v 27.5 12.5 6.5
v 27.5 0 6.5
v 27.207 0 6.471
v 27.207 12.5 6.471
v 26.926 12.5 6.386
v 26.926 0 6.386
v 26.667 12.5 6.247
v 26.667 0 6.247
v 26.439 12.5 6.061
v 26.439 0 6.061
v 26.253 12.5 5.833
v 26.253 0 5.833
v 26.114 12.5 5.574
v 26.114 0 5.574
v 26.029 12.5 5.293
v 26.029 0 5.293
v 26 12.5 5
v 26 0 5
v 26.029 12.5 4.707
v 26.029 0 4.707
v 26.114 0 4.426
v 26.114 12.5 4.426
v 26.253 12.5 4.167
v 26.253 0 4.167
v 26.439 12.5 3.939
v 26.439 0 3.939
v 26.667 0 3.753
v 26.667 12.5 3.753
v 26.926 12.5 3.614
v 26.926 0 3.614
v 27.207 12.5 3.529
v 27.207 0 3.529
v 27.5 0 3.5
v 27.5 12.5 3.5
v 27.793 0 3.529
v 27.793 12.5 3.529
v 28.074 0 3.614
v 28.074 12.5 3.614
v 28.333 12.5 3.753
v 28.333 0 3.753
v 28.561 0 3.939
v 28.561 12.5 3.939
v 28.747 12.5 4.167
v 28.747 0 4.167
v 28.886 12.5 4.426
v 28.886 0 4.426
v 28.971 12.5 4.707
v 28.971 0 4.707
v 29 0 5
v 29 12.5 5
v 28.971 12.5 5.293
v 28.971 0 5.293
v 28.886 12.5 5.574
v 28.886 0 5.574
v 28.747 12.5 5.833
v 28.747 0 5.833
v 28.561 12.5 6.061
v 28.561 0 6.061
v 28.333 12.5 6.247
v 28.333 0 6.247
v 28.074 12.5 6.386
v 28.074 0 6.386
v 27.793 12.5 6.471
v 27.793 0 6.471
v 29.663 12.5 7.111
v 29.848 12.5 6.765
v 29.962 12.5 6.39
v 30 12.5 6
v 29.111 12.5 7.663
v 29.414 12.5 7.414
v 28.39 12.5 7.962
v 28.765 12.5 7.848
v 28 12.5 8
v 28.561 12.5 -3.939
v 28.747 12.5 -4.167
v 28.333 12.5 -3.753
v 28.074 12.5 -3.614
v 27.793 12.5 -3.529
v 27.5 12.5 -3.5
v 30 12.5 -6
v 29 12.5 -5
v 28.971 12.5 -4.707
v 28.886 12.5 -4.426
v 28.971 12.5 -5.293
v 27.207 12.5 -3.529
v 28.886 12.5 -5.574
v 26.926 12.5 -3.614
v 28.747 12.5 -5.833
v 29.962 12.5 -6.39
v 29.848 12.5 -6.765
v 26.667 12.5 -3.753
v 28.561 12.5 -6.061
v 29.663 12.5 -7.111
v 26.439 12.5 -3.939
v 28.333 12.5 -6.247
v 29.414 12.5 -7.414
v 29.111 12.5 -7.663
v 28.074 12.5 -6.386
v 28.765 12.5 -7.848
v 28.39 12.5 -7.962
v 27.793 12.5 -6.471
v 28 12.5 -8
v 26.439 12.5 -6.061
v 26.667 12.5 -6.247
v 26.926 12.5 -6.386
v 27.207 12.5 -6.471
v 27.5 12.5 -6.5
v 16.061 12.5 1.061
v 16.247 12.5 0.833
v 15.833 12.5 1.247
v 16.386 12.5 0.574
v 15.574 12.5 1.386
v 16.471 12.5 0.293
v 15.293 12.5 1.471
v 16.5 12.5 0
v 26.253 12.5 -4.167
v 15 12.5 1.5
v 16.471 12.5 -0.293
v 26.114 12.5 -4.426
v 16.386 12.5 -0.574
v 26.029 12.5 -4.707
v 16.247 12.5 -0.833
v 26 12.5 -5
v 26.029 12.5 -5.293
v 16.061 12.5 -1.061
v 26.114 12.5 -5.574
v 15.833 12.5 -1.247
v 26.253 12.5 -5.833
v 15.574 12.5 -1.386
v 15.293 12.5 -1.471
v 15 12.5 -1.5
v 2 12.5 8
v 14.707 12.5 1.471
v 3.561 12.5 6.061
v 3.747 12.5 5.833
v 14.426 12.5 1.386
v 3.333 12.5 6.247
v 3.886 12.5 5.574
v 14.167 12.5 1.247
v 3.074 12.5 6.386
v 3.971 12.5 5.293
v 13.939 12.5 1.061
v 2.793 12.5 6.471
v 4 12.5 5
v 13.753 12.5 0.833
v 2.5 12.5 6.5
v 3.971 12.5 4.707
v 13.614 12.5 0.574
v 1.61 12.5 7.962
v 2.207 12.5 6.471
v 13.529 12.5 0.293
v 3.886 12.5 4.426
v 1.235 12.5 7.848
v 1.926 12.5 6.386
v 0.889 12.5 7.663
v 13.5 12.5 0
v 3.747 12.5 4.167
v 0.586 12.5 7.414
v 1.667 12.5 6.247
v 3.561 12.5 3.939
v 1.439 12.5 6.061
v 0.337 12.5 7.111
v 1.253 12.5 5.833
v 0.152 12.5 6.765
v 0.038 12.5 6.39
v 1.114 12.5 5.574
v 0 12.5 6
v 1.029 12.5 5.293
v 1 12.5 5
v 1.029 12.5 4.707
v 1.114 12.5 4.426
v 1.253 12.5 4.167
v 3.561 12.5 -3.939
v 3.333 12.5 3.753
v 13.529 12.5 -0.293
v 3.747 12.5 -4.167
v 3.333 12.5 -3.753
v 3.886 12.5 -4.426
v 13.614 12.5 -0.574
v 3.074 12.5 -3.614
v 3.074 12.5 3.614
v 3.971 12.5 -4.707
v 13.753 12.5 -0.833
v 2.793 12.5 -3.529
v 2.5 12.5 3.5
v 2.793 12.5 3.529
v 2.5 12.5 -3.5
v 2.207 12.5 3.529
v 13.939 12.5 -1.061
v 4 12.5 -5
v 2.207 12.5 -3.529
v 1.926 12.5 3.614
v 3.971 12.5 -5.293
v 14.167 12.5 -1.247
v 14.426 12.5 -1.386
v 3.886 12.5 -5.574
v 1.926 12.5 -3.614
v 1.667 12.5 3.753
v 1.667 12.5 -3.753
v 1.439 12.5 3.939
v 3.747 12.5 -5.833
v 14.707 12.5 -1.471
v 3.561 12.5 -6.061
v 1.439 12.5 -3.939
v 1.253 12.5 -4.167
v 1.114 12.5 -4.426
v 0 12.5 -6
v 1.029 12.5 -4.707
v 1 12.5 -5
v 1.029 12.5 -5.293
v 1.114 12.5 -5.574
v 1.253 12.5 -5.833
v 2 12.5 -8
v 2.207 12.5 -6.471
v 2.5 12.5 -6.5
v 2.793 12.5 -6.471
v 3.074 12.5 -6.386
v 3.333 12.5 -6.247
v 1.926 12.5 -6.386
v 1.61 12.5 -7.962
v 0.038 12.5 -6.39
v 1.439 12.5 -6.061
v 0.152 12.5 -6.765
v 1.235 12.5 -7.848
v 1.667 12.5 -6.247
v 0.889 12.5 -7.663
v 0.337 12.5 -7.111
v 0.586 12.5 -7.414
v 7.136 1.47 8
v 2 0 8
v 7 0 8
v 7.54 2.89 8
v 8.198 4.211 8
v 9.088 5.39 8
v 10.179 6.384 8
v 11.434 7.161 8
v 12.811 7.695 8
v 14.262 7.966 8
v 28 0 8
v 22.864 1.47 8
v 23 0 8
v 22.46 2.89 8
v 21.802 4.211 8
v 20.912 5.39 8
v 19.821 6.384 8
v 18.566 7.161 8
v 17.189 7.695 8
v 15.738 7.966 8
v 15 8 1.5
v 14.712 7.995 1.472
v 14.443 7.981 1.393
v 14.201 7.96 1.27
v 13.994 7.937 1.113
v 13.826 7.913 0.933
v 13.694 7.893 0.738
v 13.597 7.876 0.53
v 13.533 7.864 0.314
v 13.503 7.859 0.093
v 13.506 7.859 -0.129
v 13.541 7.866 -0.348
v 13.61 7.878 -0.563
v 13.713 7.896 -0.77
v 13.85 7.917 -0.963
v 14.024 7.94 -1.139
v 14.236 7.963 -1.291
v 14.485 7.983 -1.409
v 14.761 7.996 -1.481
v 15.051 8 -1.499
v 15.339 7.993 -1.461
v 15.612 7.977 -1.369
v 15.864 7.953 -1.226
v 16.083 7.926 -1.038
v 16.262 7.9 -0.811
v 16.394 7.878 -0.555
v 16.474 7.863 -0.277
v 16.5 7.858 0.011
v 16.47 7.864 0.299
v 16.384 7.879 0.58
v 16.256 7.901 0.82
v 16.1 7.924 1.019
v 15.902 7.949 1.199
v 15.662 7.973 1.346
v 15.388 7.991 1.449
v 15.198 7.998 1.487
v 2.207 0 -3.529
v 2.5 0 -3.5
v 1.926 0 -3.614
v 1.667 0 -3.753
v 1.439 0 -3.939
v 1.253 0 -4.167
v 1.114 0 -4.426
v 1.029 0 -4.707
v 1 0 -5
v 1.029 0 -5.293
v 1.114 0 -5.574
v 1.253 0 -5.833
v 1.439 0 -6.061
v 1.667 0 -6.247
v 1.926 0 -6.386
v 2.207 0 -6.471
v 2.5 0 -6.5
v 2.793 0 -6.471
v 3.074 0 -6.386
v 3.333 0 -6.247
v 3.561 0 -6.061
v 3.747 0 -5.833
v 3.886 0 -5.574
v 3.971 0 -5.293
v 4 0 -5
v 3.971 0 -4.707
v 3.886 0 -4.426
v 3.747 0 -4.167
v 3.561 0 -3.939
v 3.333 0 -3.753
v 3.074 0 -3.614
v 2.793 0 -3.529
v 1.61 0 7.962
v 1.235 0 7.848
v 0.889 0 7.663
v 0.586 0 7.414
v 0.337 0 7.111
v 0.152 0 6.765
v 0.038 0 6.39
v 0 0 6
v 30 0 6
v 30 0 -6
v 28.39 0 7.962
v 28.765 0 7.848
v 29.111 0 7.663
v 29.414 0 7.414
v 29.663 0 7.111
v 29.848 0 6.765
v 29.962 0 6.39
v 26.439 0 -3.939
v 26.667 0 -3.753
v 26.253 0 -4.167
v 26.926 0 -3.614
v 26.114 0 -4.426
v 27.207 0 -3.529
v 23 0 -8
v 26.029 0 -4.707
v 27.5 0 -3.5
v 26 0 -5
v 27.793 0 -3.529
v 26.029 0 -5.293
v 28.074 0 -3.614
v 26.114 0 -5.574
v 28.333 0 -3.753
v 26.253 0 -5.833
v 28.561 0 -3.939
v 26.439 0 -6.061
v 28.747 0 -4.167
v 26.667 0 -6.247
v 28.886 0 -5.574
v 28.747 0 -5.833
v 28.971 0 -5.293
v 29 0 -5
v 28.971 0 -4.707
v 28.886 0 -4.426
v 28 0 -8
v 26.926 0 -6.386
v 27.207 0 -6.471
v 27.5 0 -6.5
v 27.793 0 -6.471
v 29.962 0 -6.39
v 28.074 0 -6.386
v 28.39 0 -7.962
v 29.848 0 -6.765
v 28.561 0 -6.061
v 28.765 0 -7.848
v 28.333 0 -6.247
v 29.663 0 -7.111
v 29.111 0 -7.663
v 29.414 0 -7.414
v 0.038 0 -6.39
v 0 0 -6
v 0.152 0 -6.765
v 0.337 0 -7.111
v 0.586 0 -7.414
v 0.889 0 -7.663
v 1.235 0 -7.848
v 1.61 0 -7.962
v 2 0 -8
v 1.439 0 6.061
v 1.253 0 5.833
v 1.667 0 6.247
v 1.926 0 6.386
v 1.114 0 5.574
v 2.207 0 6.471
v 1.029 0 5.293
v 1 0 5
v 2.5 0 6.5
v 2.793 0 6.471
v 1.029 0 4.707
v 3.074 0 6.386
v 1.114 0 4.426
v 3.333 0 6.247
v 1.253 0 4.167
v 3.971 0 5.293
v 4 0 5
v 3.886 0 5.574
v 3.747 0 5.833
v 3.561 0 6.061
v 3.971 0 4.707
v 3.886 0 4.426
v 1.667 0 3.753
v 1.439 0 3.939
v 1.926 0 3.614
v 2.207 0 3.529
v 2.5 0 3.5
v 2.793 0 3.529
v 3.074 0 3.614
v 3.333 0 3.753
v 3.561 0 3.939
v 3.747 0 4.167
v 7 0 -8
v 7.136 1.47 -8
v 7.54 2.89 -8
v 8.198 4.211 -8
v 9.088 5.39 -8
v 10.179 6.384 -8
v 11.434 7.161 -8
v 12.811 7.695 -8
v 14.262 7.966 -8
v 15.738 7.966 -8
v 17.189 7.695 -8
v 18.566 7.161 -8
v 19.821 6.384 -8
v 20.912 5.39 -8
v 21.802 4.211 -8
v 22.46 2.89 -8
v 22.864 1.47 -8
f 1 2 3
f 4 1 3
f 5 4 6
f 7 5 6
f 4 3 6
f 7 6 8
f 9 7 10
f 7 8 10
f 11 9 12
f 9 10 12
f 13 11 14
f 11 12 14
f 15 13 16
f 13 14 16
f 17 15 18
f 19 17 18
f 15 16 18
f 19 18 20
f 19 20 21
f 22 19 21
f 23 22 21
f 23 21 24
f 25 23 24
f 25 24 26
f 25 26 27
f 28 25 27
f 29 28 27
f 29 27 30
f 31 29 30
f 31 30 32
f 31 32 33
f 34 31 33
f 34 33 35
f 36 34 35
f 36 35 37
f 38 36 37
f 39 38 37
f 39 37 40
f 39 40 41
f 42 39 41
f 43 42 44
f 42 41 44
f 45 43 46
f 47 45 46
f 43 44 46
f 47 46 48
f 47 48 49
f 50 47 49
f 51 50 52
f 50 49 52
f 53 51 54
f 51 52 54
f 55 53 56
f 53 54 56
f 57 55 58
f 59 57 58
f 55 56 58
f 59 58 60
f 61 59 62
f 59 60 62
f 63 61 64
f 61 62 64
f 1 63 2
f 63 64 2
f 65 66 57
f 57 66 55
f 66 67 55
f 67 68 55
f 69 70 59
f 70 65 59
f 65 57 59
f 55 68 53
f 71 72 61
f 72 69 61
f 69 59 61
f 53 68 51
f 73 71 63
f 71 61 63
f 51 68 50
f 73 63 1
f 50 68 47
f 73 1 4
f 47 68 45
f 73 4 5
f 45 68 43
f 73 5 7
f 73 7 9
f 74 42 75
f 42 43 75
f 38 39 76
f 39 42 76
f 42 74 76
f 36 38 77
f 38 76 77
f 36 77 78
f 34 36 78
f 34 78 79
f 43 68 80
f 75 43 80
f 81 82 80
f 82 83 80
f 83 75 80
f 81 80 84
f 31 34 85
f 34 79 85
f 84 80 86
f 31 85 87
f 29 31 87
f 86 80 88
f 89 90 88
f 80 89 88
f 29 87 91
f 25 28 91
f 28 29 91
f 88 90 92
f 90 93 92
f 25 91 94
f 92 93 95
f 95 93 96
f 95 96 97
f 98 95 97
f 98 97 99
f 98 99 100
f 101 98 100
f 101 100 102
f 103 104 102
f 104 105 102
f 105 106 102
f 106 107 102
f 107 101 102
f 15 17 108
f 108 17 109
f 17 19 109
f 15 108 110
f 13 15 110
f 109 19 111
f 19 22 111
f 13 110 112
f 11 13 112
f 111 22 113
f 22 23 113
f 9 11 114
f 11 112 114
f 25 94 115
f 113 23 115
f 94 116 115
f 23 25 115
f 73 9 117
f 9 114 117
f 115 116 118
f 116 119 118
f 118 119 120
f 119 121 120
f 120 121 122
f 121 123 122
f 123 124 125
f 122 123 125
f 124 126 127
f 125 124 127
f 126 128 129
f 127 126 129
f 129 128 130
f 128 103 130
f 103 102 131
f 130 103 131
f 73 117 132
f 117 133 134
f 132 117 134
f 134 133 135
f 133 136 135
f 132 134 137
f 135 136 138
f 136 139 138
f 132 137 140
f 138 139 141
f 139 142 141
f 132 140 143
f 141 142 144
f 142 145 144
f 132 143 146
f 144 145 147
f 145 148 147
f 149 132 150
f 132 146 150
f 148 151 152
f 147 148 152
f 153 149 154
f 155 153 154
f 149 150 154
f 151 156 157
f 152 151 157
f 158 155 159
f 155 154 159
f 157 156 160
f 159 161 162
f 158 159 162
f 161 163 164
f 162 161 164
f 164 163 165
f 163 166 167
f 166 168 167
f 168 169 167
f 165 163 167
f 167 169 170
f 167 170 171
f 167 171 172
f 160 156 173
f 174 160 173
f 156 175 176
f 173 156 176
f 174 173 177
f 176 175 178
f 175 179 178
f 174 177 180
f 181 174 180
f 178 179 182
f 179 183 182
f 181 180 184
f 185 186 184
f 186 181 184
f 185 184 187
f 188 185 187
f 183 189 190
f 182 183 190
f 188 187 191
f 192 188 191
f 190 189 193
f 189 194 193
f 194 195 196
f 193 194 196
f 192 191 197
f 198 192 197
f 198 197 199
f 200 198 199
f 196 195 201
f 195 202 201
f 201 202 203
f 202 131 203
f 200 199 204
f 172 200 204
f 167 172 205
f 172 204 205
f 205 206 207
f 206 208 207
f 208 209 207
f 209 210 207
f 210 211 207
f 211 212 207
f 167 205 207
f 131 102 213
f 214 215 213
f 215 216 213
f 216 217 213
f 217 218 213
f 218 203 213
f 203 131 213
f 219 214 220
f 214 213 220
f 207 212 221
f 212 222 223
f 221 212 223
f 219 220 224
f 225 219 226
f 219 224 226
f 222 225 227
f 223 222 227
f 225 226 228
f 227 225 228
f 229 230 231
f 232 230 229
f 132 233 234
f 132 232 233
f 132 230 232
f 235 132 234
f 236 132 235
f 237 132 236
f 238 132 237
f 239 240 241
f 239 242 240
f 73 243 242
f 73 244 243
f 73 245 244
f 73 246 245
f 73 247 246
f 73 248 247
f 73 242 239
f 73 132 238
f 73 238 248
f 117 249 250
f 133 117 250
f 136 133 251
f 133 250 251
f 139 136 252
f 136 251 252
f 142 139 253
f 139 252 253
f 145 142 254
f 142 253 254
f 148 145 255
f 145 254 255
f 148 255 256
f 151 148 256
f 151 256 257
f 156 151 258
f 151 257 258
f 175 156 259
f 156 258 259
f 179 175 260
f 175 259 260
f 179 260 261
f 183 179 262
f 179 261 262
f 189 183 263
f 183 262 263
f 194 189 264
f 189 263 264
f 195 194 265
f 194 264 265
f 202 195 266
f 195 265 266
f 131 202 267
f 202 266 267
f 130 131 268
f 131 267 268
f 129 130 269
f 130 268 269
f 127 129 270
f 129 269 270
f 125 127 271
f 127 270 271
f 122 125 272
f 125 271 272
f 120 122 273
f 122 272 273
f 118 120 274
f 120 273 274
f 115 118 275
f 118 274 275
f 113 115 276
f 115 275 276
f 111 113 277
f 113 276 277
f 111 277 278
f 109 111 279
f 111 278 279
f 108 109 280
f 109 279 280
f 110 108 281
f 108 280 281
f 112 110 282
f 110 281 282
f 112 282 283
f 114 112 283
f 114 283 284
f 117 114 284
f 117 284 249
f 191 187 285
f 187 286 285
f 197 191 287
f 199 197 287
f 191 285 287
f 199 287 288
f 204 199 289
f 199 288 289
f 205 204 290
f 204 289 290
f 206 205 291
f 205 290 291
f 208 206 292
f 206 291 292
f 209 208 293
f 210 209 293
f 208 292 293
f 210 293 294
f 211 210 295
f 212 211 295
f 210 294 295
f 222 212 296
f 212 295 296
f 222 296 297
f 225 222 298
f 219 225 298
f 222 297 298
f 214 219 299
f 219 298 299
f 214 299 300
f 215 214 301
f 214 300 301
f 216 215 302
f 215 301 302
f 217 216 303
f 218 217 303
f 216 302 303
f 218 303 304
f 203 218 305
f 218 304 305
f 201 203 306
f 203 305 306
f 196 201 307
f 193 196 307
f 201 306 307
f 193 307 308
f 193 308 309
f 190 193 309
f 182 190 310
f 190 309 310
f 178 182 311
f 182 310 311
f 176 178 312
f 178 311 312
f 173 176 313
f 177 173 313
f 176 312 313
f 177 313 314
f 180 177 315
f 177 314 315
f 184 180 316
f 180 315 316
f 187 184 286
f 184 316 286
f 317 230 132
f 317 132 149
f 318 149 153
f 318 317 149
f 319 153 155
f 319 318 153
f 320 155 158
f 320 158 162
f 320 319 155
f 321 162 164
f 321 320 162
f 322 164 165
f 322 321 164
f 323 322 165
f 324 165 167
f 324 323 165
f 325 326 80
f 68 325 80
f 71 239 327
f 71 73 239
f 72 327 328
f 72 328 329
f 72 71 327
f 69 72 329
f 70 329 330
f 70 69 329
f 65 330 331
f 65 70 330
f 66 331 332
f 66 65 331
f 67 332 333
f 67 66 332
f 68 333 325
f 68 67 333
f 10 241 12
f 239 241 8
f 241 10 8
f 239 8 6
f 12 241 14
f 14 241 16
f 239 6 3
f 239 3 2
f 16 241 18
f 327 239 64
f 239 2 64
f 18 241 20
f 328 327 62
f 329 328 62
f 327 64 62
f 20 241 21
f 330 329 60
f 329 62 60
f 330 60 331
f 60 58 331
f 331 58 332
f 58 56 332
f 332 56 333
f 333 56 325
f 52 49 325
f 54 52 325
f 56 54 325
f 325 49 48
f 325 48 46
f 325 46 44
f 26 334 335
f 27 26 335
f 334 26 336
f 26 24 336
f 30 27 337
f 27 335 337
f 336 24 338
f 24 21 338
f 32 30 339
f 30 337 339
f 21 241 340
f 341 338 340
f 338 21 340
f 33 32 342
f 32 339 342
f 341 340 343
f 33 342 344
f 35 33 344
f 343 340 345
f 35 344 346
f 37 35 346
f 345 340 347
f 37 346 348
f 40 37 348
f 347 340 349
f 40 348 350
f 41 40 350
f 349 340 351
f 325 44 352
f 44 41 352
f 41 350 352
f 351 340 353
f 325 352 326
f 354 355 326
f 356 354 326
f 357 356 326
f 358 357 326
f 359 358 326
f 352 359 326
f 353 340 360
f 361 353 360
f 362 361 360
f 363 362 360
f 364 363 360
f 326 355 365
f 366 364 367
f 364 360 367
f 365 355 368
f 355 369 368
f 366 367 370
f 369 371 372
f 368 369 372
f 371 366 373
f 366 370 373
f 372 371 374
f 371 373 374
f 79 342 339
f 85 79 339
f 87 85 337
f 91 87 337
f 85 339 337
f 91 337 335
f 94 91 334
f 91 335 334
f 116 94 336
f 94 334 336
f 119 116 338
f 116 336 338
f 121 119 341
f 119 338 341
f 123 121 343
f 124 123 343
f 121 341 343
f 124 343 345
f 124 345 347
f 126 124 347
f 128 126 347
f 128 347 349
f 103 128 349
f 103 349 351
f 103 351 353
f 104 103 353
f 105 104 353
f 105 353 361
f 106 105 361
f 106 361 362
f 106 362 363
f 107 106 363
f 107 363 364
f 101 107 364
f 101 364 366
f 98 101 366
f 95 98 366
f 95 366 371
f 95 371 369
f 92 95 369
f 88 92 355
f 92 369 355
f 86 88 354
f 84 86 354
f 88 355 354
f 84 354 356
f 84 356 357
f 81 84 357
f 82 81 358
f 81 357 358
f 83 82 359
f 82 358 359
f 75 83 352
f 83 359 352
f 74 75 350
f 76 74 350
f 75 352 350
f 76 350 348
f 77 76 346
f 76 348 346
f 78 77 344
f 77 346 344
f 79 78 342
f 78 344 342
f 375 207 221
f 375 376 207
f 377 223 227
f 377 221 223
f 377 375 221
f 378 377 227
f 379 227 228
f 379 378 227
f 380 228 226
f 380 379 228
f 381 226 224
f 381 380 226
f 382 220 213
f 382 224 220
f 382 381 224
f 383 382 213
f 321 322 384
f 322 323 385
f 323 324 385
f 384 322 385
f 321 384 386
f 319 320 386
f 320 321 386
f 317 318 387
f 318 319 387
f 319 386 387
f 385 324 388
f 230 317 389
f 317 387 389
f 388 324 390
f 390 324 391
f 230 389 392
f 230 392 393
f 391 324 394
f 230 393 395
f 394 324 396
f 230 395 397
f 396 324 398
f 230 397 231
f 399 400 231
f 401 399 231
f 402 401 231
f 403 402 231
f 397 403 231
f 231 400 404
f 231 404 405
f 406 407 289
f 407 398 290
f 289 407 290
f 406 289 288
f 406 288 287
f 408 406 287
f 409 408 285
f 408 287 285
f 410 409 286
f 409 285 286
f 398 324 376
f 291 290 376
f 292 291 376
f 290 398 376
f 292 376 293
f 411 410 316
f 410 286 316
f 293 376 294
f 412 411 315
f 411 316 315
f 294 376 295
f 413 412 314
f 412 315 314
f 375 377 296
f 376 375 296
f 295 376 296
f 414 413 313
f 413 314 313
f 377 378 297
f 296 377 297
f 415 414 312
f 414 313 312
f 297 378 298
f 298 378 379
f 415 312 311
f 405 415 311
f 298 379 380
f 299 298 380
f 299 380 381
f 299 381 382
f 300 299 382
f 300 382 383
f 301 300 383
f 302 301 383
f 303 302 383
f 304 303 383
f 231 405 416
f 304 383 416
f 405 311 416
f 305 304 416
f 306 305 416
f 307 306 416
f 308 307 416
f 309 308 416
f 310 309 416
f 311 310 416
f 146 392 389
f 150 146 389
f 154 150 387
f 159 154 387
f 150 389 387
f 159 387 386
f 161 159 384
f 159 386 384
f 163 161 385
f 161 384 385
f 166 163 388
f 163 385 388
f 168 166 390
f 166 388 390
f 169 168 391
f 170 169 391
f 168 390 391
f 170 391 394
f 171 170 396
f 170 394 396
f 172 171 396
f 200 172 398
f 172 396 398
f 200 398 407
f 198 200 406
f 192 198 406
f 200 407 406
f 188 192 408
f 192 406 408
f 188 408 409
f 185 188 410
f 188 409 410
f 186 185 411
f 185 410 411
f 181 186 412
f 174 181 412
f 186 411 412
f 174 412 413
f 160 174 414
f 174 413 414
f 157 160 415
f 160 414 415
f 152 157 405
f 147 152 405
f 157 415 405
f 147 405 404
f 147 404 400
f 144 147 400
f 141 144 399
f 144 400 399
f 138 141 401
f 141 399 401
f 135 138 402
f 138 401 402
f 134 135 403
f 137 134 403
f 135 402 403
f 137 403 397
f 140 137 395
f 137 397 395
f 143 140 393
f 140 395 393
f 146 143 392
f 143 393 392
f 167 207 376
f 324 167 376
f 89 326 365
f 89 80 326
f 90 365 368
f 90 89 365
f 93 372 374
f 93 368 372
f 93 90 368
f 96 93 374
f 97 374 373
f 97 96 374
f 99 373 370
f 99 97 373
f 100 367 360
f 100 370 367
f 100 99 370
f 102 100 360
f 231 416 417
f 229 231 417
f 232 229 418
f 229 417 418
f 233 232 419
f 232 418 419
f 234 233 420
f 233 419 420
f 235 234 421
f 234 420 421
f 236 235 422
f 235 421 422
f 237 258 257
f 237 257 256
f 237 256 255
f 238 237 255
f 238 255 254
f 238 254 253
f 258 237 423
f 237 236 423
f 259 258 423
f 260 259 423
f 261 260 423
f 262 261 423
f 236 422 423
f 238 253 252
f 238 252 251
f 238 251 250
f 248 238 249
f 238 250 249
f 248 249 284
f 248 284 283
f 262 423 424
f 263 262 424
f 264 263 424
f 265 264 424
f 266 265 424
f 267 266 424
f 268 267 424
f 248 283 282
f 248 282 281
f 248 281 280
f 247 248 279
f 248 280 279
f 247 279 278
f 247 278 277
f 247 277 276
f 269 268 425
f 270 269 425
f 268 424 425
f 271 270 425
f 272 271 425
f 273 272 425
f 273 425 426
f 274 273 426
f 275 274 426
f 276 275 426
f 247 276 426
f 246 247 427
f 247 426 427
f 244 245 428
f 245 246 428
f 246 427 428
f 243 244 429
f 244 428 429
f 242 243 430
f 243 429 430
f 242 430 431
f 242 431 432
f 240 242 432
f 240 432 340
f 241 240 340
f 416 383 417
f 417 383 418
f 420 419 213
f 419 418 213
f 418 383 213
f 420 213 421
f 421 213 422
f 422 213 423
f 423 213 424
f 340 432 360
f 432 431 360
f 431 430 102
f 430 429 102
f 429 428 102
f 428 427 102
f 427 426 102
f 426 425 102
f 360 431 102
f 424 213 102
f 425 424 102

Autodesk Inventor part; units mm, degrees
ref_plane "YZ Plane" through (0, 0, 0) normal (1, 0, 0) x (0, 1, 0)
ref_plane "XZ Plane" through (0, 0, 0) normal (0, 1, 0) x (-1, 0, 0)
ref_plane "XY Plane" through (0, 0, 0) normal (0, 0, 1) x (1, 0, 0)
sketch "Sketch1" plane through (0, 0, 0) normal (0, 0, 1) x (1, 0, 0)
  line L0 (0, 0) -> (30, 0)
  line L1 (30, 0) -> (30, 12.5)
  line L2 (30, 12.5) -> (0, 12.5)
  line L3 (0, 12.5) -> (0, 0)
  circle A0 centre (15, 0) radius 8
  point P0 (7, 0)
  point P1 (23, 0)
  dimension "d0" = 30
  dimension "d1" = 12.5
  dimension "d2" = 16
extrude "Extrusion1" add sketch "Sketch1" along normal mid plane 16 contours A0 L0 L3 L2 L1
sketch "Sketch2" plane through (0, 12.5, 8) normal (0, 1, 0) x (1, 0, 0)
  line L0 (0, 16) -> (0, 0) projected
  line L1 (30, 0) -> (0, 0) projected
  line L2 (30, 16) -> (30, 0) projected
  line L3 (0, 16) -> (30, 16) projected
  line L4 (23, 0) -> (7, 0) projected
  line L5 (15, 0) -> (15, 16)
  line L6 (0, 8) -> (30, 8)
  line L7 (2.5, 3) -> (27.5, 3)
  line L8 (27.5, 3) -> (27.5, 13)
  line L9 (27.5, 13) -> (2.5, 13)
  line L10 (2.5, 13) -> (2.5, 3)
  point P0 (15, 8)
  dimension "d5" = 25
  dimension "d6" = 10
hole "Hole1" at (2.5, 12.5, 5) at (2.5, 12.5, -5) at (27.5, 12.5, -5) at (27.5, 12.5, 5) at (15, 12.5, 0) direction (0, -1, 0) diameter 3 end through all
fillet "Fillet1" radius 2 4 edges at (0, 6.25, 8) (30, 6.25, -8) (30, 6.25, 8) (0, 6.25, -8)
properties part number "base2" material "PVC-Piping"
